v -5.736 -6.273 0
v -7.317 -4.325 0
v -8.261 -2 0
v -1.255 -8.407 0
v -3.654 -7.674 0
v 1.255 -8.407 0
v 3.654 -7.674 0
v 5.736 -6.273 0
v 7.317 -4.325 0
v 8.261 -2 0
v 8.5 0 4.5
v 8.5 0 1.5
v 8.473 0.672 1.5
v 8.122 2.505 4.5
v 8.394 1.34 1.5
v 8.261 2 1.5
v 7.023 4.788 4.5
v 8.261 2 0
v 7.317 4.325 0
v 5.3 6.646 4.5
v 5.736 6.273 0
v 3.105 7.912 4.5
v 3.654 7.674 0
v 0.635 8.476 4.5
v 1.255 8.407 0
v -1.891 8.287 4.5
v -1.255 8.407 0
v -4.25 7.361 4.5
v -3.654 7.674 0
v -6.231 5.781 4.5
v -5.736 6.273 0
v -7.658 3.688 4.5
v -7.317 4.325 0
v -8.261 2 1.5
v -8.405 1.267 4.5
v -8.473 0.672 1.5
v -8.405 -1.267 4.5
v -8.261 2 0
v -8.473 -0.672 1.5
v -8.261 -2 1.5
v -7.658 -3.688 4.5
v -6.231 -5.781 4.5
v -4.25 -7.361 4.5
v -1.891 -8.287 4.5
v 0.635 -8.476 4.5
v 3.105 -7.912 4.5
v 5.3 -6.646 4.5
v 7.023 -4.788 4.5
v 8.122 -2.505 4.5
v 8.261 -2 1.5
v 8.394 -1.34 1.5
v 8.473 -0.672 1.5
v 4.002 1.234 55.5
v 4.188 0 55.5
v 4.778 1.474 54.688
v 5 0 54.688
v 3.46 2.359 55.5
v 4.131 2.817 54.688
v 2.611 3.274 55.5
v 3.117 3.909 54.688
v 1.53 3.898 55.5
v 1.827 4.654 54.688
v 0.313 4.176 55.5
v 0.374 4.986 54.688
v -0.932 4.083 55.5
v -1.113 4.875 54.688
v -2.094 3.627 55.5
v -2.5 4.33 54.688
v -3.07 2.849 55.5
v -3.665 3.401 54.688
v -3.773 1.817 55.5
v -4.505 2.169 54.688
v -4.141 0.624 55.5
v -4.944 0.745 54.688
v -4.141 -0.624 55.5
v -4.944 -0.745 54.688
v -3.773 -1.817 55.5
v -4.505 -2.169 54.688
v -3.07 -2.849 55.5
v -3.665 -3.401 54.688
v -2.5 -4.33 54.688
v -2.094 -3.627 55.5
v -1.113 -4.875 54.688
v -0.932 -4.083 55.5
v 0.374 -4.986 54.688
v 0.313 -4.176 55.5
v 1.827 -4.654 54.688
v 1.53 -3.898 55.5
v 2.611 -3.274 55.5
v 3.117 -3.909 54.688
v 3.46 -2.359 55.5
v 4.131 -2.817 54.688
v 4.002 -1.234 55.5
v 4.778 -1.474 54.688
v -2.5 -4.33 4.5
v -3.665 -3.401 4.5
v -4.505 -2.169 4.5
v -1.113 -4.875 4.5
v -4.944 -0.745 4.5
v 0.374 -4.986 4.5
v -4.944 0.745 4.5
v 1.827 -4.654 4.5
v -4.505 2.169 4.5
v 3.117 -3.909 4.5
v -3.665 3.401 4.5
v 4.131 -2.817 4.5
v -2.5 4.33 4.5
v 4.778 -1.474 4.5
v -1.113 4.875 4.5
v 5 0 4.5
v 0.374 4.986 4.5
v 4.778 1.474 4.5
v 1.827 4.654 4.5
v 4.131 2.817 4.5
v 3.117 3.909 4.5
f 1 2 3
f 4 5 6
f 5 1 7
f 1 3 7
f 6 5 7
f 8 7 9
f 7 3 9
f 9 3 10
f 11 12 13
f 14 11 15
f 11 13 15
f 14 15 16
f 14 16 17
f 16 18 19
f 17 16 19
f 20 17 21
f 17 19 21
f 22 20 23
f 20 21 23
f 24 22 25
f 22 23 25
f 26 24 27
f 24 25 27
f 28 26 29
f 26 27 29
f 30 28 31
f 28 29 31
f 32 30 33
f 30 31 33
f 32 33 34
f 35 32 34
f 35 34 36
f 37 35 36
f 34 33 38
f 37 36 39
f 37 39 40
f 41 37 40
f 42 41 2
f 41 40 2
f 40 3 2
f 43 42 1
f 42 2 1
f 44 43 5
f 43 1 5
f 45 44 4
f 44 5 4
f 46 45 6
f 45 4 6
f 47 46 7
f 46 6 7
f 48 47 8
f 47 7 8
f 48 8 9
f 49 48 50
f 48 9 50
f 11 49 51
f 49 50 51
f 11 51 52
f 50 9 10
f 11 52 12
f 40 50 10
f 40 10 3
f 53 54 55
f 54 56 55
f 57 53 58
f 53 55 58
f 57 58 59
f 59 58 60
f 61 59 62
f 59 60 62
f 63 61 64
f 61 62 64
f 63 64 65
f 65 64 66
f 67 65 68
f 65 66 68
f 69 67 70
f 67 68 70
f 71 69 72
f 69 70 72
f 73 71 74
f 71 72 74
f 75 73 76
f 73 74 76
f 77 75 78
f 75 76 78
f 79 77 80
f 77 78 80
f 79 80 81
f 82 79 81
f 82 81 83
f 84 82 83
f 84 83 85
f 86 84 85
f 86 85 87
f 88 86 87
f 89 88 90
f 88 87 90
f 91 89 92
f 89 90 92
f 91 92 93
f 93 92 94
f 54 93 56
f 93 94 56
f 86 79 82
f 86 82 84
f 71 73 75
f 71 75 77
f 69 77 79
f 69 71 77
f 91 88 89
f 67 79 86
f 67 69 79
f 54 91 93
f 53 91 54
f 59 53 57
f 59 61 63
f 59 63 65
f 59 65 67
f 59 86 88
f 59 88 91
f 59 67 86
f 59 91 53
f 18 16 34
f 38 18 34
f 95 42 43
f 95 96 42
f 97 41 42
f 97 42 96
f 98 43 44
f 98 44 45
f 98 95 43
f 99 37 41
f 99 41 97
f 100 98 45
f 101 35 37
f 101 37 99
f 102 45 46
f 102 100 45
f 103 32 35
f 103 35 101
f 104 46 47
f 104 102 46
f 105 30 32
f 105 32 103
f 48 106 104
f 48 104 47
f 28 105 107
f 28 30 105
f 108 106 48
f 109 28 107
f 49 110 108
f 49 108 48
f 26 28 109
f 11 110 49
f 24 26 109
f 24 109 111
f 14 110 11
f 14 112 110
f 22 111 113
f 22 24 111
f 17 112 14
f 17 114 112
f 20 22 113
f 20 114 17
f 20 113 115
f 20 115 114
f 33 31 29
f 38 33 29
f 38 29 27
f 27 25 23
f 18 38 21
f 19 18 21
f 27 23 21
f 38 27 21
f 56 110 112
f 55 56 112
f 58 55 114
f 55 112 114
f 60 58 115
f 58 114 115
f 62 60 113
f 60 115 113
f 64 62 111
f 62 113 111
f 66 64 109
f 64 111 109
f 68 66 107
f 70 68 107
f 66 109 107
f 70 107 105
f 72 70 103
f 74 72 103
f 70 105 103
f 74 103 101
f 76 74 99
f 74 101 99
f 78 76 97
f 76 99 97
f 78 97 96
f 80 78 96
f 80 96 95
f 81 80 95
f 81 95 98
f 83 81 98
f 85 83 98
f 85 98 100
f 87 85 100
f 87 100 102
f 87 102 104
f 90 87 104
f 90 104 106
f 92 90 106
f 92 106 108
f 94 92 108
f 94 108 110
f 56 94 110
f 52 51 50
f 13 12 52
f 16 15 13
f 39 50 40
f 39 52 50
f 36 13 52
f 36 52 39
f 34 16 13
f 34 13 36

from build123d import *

# Parameters (mm, degrees)
SKETCH_1_R               = 8.5
EXTRUDE_1_DEPTH          = 4.5
SKETCH_2_R               = 5
EXTRUDE_2_DEPTH          = 55.5
CUT_EXTRUDE_1_DEPTH      = 57.786882288
CUT_EXTRUDE_1_DEPTH_BACK = 1.5
SKETCH_5_W               = 17
SKETCH_5_H               = 4


# Read off the part's stored shape, not the designer's step: M10 机械螺纹 螺柱1
with BuildPart() as part:
    # 草图1 → 凸台-拉伸1 (new body)
    with BuildSketch(Plane.XY):
        Circle(SKETCH_1_R)
    extrude(amount=EXTRUDE_1_DEPTH)

    # 草图2 → 凸台-拉伸2 (add)
    with BuildSketch(Plane.XY):
        Circle(SKETCH_2_R)
    extrude(amount=EXTRUDE_2_DEPTH)

    # M10 机械螺纹 螺柱1 outline → M10 机械螺纹 螺柱1 (revolve, cut)
    with BuildSketch(Plane.XZ):
        Polygon((5, 55.5), (4.188, 55.5), (5, 54.688), align=None)
    revolve(axis=Axis((0, 0, 0), (0, 0, 1)), mode=Mode.SUBTRACT)

    # 草图5 → 切除-拉伸-薄壁1 (cut, two sides: drawn at the far end of the back side and taken through both)
    with BuildSketch(Plane(origin=(0, 0, 0), x_dir=(-1, 0, 0), z_dir=(0, 0, -1)).offset(-CUT_EXTRUDE_1_DEPTH_BACK)):
        Rectangle(SKETCH_5_W, SKETCH_5_H)
    extrude(amount=CUT_EXTRUDE_1_DEPTH + CUT_EXTRUDE_1_DEPTH_BACK, mode=Mode.SUBTRACT)


solid = part.part
